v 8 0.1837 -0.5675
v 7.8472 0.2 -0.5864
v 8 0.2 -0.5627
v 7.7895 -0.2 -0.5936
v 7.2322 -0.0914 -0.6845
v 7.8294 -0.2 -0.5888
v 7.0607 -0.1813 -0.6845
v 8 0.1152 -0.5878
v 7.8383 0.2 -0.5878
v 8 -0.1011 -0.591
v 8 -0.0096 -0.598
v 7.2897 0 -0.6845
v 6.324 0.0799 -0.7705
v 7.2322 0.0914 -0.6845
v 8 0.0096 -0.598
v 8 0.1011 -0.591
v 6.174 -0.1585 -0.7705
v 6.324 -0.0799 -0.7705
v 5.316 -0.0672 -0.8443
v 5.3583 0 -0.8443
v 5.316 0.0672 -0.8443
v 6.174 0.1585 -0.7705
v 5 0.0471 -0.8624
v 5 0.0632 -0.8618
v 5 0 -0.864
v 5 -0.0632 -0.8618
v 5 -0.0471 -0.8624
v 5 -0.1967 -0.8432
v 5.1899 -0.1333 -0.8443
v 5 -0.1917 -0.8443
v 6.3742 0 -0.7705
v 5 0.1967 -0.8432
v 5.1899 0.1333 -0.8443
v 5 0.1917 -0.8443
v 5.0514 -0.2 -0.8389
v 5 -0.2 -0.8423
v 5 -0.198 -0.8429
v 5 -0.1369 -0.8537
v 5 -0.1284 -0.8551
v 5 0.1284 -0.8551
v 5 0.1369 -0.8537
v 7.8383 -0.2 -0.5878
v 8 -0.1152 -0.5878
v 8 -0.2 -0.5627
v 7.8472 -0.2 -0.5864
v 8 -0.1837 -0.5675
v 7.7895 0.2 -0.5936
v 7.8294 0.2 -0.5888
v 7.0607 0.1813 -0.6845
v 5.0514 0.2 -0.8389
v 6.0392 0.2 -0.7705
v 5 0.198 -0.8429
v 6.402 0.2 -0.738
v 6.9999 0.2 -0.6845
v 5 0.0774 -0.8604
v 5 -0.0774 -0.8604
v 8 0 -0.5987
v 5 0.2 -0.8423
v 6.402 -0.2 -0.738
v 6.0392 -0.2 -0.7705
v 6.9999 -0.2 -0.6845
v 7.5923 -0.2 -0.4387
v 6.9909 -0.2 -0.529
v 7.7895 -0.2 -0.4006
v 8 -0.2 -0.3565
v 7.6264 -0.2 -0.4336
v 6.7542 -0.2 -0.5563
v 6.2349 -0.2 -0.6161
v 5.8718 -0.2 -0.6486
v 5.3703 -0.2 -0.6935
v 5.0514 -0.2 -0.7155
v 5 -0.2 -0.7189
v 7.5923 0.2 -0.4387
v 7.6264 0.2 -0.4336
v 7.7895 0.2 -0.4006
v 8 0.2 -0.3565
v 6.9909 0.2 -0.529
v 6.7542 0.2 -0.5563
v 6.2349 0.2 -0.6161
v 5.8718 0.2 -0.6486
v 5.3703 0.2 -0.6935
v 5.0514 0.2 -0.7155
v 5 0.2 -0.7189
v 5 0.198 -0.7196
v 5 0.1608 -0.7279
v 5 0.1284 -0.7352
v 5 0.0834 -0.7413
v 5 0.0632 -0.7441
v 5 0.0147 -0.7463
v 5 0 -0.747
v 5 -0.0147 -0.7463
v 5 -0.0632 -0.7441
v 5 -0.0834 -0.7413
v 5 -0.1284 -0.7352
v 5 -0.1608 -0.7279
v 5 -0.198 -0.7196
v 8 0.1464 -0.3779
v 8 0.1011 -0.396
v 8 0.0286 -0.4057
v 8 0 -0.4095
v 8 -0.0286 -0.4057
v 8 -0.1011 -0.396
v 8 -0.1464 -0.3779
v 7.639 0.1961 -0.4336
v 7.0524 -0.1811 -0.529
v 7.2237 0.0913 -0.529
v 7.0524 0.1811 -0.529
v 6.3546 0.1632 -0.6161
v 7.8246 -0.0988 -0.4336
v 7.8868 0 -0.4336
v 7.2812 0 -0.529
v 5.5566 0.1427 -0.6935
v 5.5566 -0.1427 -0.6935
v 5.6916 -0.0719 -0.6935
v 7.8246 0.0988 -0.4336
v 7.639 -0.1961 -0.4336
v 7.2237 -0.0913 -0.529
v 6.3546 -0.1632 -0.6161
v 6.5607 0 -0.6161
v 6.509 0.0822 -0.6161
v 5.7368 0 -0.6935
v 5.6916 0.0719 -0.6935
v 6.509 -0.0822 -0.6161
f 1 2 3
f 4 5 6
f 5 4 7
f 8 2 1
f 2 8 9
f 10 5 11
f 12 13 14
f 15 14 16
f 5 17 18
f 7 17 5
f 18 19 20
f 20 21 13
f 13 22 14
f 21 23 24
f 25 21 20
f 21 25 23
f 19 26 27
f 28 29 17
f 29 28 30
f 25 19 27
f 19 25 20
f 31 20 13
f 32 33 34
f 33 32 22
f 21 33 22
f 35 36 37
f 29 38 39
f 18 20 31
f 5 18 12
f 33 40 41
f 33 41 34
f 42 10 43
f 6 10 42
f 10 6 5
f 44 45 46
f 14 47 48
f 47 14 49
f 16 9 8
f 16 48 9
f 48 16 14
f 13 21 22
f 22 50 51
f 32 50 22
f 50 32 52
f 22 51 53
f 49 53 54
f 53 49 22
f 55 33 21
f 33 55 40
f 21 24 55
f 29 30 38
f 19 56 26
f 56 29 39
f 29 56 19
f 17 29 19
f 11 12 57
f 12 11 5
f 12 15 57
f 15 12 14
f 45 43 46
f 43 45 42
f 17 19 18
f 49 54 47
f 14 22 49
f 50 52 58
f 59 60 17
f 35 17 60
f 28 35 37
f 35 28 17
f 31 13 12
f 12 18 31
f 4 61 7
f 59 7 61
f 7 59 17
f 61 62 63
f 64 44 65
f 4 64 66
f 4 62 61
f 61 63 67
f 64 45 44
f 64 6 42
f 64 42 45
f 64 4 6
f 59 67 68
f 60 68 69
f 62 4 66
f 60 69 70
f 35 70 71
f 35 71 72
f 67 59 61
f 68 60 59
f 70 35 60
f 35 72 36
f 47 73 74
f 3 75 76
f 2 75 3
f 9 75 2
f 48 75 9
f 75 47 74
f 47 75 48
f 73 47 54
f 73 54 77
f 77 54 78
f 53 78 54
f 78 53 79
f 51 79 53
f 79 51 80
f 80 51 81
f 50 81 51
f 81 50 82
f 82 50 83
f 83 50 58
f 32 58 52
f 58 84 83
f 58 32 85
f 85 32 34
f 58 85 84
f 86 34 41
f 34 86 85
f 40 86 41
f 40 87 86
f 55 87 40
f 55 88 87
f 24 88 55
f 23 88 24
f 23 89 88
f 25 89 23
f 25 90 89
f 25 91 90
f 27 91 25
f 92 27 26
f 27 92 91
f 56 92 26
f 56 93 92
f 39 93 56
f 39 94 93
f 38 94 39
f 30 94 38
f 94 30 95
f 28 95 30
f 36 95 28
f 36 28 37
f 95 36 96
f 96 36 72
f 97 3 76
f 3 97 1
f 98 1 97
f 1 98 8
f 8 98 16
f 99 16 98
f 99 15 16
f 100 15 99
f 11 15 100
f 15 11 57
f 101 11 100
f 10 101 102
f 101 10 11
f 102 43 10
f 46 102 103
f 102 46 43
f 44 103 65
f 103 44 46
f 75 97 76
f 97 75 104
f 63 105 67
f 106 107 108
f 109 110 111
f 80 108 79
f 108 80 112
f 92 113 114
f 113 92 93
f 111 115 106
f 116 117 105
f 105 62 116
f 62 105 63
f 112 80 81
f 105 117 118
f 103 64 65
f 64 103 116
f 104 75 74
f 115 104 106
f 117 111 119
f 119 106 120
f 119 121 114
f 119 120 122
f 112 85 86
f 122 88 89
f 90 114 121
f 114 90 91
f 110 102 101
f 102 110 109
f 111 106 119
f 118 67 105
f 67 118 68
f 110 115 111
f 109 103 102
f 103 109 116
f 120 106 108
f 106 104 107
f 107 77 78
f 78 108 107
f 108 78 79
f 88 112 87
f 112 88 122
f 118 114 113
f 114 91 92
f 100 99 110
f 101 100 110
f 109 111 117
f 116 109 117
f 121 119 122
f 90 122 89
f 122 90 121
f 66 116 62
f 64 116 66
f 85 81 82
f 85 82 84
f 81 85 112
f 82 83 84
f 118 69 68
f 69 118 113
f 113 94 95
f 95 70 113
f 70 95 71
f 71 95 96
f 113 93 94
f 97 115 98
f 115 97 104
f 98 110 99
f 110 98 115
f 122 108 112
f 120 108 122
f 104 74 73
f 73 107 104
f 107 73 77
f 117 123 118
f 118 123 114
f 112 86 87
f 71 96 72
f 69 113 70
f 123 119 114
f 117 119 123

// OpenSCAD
// file: ship_hull.scad
module ship_hull(hull_length=10, hull_radius=1, N=50) {
	scale([hull_length,hull_radius,hull_radius]) sphere(r=1.0,$fn=N);
}
hull();
// main file
use <ship_hull.scad>
module forward_landing_gear(hull_length=10, hull_radius=1,N=50){
	cubey=1;
		//union(){
		difference(){
			ship_hull(hull_length,hull_radius,N);
			mirror([0,1,0])		translate([0,cubey/2+.2,0])cube([hull_length*2,cubey,hull_radius*2],center=true);
			translate([0,cubey/2+.2,0])cube([hull_length*2,cubey,hull_radius*2],center=true);
			translate([0,0,hull_radius/2])cube([hull_length*2,1,1],center=true);
			translate([-5,0,-hull_radius/2])cube([hull_length*2,1,1],center=true);
			translate([hull_length-1,0,0])cube([2,1,2],center=true);
			scale(0.9)scale([hull_length,hull_radius,hull_radius]) sphere(r=1.0,$fn=N);
		}
}

forward_landing_gear();
